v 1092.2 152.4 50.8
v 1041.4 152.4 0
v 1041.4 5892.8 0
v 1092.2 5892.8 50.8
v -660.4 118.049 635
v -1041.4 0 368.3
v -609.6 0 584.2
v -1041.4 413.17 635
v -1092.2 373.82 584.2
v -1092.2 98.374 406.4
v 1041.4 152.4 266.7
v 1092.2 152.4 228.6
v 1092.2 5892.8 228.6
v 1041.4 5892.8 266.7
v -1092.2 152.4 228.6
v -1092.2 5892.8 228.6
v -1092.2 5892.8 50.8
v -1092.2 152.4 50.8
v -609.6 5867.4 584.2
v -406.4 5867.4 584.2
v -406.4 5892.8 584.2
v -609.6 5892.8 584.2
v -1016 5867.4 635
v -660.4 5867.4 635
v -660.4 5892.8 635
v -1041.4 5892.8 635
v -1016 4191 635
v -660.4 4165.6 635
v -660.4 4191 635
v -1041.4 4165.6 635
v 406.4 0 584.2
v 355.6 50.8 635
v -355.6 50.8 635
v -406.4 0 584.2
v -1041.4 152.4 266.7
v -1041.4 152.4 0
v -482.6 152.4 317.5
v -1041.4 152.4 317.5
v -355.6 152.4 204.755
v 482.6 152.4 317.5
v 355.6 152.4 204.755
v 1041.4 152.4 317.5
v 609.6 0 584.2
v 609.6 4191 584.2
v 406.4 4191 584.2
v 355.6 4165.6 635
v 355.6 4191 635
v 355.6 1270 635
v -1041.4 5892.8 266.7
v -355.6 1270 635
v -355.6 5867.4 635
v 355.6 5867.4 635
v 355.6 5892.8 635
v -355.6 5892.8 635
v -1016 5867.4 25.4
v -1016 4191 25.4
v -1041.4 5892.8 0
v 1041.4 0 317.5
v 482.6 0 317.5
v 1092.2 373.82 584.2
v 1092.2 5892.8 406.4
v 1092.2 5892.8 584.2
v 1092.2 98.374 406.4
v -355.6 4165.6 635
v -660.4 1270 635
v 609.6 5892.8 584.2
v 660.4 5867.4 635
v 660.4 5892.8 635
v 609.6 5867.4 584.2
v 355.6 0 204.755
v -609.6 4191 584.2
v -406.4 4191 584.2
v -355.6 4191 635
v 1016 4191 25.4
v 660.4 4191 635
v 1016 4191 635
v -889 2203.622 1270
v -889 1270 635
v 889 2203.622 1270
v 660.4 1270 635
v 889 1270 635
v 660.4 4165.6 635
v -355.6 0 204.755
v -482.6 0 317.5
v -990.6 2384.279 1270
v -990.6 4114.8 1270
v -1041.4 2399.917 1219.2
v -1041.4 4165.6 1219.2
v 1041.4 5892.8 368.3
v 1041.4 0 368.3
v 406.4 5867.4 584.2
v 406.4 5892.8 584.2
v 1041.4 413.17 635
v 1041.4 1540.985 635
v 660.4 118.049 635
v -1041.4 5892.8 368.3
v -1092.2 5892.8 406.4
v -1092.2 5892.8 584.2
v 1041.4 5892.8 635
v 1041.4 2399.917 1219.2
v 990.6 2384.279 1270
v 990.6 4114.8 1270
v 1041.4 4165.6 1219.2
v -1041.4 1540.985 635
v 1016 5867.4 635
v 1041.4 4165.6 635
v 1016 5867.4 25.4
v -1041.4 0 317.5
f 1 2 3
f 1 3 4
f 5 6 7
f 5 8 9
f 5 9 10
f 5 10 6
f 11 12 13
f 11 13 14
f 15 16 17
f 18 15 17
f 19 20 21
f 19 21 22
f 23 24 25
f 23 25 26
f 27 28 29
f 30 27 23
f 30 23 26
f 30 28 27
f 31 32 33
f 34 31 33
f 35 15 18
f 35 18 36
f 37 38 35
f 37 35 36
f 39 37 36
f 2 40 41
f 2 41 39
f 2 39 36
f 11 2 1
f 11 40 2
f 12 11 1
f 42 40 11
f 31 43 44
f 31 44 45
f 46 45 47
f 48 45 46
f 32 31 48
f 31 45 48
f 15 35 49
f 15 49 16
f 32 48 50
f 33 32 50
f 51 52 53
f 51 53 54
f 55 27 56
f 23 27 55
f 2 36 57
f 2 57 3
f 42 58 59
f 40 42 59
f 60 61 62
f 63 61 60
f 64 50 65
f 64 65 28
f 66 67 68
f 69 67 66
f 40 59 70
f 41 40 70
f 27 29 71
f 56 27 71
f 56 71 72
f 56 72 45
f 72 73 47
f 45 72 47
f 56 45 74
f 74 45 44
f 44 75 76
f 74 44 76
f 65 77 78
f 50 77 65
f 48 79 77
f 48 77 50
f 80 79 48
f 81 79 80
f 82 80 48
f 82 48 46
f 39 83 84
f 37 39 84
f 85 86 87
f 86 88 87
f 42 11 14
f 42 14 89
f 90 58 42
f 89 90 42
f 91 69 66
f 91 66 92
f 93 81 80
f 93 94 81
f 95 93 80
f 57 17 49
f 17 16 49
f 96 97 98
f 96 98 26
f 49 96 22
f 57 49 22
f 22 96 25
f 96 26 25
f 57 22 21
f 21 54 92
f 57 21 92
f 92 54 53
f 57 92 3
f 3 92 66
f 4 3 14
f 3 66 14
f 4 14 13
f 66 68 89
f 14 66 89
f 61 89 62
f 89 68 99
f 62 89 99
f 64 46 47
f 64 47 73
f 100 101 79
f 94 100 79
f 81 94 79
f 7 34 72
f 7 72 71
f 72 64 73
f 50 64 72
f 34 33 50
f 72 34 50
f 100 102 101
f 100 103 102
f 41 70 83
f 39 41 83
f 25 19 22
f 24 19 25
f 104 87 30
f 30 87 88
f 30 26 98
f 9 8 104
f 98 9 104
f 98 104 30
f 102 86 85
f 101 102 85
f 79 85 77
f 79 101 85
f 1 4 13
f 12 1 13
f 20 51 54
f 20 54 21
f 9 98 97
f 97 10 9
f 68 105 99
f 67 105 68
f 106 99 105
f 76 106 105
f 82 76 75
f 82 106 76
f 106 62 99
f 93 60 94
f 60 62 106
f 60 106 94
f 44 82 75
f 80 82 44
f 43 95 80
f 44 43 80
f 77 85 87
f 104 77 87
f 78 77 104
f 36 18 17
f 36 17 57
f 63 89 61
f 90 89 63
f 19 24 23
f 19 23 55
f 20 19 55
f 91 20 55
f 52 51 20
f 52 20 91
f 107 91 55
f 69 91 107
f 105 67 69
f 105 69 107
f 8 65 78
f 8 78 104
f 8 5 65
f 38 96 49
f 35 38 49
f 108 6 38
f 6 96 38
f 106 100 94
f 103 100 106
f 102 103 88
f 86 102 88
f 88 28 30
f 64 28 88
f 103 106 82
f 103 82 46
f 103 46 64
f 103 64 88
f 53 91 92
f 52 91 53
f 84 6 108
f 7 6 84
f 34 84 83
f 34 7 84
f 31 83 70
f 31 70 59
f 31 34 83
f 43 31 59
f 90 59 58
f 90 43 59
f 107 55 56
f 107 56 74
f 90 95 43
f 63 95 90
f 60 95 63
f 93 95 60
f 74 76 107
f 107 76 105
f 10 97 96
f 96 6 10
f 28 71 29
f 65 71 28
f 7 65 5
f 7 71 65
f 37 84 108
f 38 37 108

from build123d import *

# Parameters (mm, degrees)
F1_DEPTH  = 5892.8
F4_W      = 1237.3383492231
F4_H      = 606.1354875565
F5_DEPTH  = 254
F6_SIZE   = 50.8
F7_SIZE   = 50.8
F10_W     = 796.8522012234
F10_H     = 674.4315624237
F11_DEPTH = 254
F12_SIZE  = 50.8
F13_W     = 2032
F13_H     = 1676.4
F14_DEPTH = 609.6
F17_DEPTH = 152.4
F19_DEPTH = 2082.8
F20_SIZE  = 50.8
F21_SIZE  = 50.8
F22_SIZE  = 50.8
F23_SIZE  = 152.4
F24_SIZE  = 152.4


with BuildPart() as f1:
    # F0 (on Front) → F1 (new body)
    with BuildSketch(Plane.XZ):
        Polygon((-1092.2, 50.8), (-1041.4, 0), (1041.4, 0), (1092.2, 50.8), (1092.2, 228.6), (1041.4, 266.7), (1041.4, 368.3), (1092.2, 406.4), (1092.2, 584.2), (1041.4, 635), (660.4, 635), (609.6, 584.2), (406.4, 584.2), (355.6, 635), (-355.6, 635), (-406.4, 584.2), (-609.6, 584.2), (-660.4, 635), (-1041.4, 635), (-1092.2, 584.2), (-1092.2, 406.4), (-1041.4, 368.3), (-1041.4, 266.7), (-1092.2, 228.6), align=None)
    extrude(amount=-F1_DEPTH)

    # F4 (on line) → F5 (cut)
    with BuildSketch(Plane(origin=(266.7, -344.3082194778, 533.4), x_dir=(0.9219544457, 0.2100420126, -0.3253956867), z_dir=(0.3872983346, -0.5, 0.7745966692))):
        with Locations((750.6187930703, 477.5711297989)):
            Rectangle(F4_W, F4_H)
    extrude(amount=F5_DEPTH, mode=Mode.SUBTRACT)

    # F6
    f6_edges = [f1.edges().sort_by_distance(p)[0] for p in [
        (0, 0, 635),
    ]]
    chamfer(f6_edges, length=F6_SIZE)

    # F7
    f7_edges = [f1.edges().sort_by_distance(p)[0] for p in [
        (1092.2, 0, 139.7),
    ]]
    chamfer(f7_edges, length=F7_SIZE)

    # F10 (on line) → F11 (cut)
    with BuildSketch(Plane(origin=(-266.7, -344.3082194778, 533.4), x_dir=(0.9219544457, -0.2100420126, 0.3253956867), z_dir=(-0.3872983346, -0.5, 0.7745966692))):
        with Locations((-677.8981238604, 438.4608864784)):
            Rectangle(F10_W, F10_H)
    extrude(amount=F11_DEPTH, mode=Mode.SUBTRACT)

    # F12
    f12_edges = [f1.edges().sort_by_distance(p)[0] for p in [
        (-1092.2, 0, 139.7),
    ]]
    chamfer(f12_edges, length=F12_SIZE)

    # F13 (on face) → F14 (cut)
    with BuildSketch(Plane.XY.offset(635)):
        with Locations((0, 5029.2)):
            Rectangle(F13_W, F13_H)
    extrude(amount=-F14_DEPTH, mode=Mode.SUBTRACT)

    # F16 (on face) → F17 (cut)
    with BuildSketch(Plane.XZ):
        Polygon((-482.6, 317.5), (-1041.4, 317.5), (-1041.4, 266.7), (-1041.4, 0), (1041.4, 0), (1041.4, 266.7), (1041.4, 317.5), (482.6, 317.5), (355.6, 204.755038023), (-355.6, 204.755038023), align=None)
        Polygon((-1041.4, 266.7), (-1041.4, 317.5), (-1182.5258731842, 317.5), (-1182.5258731842, 0), (-1041.4, 0), align=None)
        Polygon((1041.4, 266.7), (1041.4, 0), (1174.5268106461, 0), (1174.5268106461, 317.5), (1041.4, 317.5), align=None)
    extrude(amount=-F17_DEPTH, mode=Mode.SUBTRACT)

    # F18 (on offset) → F19 (join)
    with BuildSketch(Plane.YZ.offset(1041.4)):
        Polygon((2203.6221027374, 1270), (1270, 635), (4165.6, 635), (4165.6, 1270), align=None)
    extrude(amount=-F19_DEPTH)

    # F20
    f20_edges = [f1.edges().sort_by_distance(p)[0] for p in [
        (1041.4, 3184.611051, 1270),
    ]]
    chamfer(f20_edges, length=F20_SIZE)

    # F21
    f21_edges = [f1.edges().sort_by_distance(p)[0] for p in [
        (-1041.4, 3184.611051, 1270),
    ]]
    chamfer(f21_edges, length=F21_SIZE)

    # F22
    f22_edges = [f1.edges().sort_by_distance(p)[0] for p in [
        (0, 4165.6, 1270),
    ]]
    chamfer(f22_edges, length=F22_SIZE)

    # F23
    f23_edges = [f1.edges().sort_by_distance(p)[0] for p in [
        (1041.4, 1699.466167, 927.1),
    ]]
    chamfer(f23_edges, length=F23_SIZE)

    # F24
    f24_edges = [f1.edges().sort_by_distance(p)[0] for p in [
        (-1041.4, 1699.466167, 927.1),
    ]]
    chamfer(f24_edges, length=F24_SIZE)


solid = f1.part
